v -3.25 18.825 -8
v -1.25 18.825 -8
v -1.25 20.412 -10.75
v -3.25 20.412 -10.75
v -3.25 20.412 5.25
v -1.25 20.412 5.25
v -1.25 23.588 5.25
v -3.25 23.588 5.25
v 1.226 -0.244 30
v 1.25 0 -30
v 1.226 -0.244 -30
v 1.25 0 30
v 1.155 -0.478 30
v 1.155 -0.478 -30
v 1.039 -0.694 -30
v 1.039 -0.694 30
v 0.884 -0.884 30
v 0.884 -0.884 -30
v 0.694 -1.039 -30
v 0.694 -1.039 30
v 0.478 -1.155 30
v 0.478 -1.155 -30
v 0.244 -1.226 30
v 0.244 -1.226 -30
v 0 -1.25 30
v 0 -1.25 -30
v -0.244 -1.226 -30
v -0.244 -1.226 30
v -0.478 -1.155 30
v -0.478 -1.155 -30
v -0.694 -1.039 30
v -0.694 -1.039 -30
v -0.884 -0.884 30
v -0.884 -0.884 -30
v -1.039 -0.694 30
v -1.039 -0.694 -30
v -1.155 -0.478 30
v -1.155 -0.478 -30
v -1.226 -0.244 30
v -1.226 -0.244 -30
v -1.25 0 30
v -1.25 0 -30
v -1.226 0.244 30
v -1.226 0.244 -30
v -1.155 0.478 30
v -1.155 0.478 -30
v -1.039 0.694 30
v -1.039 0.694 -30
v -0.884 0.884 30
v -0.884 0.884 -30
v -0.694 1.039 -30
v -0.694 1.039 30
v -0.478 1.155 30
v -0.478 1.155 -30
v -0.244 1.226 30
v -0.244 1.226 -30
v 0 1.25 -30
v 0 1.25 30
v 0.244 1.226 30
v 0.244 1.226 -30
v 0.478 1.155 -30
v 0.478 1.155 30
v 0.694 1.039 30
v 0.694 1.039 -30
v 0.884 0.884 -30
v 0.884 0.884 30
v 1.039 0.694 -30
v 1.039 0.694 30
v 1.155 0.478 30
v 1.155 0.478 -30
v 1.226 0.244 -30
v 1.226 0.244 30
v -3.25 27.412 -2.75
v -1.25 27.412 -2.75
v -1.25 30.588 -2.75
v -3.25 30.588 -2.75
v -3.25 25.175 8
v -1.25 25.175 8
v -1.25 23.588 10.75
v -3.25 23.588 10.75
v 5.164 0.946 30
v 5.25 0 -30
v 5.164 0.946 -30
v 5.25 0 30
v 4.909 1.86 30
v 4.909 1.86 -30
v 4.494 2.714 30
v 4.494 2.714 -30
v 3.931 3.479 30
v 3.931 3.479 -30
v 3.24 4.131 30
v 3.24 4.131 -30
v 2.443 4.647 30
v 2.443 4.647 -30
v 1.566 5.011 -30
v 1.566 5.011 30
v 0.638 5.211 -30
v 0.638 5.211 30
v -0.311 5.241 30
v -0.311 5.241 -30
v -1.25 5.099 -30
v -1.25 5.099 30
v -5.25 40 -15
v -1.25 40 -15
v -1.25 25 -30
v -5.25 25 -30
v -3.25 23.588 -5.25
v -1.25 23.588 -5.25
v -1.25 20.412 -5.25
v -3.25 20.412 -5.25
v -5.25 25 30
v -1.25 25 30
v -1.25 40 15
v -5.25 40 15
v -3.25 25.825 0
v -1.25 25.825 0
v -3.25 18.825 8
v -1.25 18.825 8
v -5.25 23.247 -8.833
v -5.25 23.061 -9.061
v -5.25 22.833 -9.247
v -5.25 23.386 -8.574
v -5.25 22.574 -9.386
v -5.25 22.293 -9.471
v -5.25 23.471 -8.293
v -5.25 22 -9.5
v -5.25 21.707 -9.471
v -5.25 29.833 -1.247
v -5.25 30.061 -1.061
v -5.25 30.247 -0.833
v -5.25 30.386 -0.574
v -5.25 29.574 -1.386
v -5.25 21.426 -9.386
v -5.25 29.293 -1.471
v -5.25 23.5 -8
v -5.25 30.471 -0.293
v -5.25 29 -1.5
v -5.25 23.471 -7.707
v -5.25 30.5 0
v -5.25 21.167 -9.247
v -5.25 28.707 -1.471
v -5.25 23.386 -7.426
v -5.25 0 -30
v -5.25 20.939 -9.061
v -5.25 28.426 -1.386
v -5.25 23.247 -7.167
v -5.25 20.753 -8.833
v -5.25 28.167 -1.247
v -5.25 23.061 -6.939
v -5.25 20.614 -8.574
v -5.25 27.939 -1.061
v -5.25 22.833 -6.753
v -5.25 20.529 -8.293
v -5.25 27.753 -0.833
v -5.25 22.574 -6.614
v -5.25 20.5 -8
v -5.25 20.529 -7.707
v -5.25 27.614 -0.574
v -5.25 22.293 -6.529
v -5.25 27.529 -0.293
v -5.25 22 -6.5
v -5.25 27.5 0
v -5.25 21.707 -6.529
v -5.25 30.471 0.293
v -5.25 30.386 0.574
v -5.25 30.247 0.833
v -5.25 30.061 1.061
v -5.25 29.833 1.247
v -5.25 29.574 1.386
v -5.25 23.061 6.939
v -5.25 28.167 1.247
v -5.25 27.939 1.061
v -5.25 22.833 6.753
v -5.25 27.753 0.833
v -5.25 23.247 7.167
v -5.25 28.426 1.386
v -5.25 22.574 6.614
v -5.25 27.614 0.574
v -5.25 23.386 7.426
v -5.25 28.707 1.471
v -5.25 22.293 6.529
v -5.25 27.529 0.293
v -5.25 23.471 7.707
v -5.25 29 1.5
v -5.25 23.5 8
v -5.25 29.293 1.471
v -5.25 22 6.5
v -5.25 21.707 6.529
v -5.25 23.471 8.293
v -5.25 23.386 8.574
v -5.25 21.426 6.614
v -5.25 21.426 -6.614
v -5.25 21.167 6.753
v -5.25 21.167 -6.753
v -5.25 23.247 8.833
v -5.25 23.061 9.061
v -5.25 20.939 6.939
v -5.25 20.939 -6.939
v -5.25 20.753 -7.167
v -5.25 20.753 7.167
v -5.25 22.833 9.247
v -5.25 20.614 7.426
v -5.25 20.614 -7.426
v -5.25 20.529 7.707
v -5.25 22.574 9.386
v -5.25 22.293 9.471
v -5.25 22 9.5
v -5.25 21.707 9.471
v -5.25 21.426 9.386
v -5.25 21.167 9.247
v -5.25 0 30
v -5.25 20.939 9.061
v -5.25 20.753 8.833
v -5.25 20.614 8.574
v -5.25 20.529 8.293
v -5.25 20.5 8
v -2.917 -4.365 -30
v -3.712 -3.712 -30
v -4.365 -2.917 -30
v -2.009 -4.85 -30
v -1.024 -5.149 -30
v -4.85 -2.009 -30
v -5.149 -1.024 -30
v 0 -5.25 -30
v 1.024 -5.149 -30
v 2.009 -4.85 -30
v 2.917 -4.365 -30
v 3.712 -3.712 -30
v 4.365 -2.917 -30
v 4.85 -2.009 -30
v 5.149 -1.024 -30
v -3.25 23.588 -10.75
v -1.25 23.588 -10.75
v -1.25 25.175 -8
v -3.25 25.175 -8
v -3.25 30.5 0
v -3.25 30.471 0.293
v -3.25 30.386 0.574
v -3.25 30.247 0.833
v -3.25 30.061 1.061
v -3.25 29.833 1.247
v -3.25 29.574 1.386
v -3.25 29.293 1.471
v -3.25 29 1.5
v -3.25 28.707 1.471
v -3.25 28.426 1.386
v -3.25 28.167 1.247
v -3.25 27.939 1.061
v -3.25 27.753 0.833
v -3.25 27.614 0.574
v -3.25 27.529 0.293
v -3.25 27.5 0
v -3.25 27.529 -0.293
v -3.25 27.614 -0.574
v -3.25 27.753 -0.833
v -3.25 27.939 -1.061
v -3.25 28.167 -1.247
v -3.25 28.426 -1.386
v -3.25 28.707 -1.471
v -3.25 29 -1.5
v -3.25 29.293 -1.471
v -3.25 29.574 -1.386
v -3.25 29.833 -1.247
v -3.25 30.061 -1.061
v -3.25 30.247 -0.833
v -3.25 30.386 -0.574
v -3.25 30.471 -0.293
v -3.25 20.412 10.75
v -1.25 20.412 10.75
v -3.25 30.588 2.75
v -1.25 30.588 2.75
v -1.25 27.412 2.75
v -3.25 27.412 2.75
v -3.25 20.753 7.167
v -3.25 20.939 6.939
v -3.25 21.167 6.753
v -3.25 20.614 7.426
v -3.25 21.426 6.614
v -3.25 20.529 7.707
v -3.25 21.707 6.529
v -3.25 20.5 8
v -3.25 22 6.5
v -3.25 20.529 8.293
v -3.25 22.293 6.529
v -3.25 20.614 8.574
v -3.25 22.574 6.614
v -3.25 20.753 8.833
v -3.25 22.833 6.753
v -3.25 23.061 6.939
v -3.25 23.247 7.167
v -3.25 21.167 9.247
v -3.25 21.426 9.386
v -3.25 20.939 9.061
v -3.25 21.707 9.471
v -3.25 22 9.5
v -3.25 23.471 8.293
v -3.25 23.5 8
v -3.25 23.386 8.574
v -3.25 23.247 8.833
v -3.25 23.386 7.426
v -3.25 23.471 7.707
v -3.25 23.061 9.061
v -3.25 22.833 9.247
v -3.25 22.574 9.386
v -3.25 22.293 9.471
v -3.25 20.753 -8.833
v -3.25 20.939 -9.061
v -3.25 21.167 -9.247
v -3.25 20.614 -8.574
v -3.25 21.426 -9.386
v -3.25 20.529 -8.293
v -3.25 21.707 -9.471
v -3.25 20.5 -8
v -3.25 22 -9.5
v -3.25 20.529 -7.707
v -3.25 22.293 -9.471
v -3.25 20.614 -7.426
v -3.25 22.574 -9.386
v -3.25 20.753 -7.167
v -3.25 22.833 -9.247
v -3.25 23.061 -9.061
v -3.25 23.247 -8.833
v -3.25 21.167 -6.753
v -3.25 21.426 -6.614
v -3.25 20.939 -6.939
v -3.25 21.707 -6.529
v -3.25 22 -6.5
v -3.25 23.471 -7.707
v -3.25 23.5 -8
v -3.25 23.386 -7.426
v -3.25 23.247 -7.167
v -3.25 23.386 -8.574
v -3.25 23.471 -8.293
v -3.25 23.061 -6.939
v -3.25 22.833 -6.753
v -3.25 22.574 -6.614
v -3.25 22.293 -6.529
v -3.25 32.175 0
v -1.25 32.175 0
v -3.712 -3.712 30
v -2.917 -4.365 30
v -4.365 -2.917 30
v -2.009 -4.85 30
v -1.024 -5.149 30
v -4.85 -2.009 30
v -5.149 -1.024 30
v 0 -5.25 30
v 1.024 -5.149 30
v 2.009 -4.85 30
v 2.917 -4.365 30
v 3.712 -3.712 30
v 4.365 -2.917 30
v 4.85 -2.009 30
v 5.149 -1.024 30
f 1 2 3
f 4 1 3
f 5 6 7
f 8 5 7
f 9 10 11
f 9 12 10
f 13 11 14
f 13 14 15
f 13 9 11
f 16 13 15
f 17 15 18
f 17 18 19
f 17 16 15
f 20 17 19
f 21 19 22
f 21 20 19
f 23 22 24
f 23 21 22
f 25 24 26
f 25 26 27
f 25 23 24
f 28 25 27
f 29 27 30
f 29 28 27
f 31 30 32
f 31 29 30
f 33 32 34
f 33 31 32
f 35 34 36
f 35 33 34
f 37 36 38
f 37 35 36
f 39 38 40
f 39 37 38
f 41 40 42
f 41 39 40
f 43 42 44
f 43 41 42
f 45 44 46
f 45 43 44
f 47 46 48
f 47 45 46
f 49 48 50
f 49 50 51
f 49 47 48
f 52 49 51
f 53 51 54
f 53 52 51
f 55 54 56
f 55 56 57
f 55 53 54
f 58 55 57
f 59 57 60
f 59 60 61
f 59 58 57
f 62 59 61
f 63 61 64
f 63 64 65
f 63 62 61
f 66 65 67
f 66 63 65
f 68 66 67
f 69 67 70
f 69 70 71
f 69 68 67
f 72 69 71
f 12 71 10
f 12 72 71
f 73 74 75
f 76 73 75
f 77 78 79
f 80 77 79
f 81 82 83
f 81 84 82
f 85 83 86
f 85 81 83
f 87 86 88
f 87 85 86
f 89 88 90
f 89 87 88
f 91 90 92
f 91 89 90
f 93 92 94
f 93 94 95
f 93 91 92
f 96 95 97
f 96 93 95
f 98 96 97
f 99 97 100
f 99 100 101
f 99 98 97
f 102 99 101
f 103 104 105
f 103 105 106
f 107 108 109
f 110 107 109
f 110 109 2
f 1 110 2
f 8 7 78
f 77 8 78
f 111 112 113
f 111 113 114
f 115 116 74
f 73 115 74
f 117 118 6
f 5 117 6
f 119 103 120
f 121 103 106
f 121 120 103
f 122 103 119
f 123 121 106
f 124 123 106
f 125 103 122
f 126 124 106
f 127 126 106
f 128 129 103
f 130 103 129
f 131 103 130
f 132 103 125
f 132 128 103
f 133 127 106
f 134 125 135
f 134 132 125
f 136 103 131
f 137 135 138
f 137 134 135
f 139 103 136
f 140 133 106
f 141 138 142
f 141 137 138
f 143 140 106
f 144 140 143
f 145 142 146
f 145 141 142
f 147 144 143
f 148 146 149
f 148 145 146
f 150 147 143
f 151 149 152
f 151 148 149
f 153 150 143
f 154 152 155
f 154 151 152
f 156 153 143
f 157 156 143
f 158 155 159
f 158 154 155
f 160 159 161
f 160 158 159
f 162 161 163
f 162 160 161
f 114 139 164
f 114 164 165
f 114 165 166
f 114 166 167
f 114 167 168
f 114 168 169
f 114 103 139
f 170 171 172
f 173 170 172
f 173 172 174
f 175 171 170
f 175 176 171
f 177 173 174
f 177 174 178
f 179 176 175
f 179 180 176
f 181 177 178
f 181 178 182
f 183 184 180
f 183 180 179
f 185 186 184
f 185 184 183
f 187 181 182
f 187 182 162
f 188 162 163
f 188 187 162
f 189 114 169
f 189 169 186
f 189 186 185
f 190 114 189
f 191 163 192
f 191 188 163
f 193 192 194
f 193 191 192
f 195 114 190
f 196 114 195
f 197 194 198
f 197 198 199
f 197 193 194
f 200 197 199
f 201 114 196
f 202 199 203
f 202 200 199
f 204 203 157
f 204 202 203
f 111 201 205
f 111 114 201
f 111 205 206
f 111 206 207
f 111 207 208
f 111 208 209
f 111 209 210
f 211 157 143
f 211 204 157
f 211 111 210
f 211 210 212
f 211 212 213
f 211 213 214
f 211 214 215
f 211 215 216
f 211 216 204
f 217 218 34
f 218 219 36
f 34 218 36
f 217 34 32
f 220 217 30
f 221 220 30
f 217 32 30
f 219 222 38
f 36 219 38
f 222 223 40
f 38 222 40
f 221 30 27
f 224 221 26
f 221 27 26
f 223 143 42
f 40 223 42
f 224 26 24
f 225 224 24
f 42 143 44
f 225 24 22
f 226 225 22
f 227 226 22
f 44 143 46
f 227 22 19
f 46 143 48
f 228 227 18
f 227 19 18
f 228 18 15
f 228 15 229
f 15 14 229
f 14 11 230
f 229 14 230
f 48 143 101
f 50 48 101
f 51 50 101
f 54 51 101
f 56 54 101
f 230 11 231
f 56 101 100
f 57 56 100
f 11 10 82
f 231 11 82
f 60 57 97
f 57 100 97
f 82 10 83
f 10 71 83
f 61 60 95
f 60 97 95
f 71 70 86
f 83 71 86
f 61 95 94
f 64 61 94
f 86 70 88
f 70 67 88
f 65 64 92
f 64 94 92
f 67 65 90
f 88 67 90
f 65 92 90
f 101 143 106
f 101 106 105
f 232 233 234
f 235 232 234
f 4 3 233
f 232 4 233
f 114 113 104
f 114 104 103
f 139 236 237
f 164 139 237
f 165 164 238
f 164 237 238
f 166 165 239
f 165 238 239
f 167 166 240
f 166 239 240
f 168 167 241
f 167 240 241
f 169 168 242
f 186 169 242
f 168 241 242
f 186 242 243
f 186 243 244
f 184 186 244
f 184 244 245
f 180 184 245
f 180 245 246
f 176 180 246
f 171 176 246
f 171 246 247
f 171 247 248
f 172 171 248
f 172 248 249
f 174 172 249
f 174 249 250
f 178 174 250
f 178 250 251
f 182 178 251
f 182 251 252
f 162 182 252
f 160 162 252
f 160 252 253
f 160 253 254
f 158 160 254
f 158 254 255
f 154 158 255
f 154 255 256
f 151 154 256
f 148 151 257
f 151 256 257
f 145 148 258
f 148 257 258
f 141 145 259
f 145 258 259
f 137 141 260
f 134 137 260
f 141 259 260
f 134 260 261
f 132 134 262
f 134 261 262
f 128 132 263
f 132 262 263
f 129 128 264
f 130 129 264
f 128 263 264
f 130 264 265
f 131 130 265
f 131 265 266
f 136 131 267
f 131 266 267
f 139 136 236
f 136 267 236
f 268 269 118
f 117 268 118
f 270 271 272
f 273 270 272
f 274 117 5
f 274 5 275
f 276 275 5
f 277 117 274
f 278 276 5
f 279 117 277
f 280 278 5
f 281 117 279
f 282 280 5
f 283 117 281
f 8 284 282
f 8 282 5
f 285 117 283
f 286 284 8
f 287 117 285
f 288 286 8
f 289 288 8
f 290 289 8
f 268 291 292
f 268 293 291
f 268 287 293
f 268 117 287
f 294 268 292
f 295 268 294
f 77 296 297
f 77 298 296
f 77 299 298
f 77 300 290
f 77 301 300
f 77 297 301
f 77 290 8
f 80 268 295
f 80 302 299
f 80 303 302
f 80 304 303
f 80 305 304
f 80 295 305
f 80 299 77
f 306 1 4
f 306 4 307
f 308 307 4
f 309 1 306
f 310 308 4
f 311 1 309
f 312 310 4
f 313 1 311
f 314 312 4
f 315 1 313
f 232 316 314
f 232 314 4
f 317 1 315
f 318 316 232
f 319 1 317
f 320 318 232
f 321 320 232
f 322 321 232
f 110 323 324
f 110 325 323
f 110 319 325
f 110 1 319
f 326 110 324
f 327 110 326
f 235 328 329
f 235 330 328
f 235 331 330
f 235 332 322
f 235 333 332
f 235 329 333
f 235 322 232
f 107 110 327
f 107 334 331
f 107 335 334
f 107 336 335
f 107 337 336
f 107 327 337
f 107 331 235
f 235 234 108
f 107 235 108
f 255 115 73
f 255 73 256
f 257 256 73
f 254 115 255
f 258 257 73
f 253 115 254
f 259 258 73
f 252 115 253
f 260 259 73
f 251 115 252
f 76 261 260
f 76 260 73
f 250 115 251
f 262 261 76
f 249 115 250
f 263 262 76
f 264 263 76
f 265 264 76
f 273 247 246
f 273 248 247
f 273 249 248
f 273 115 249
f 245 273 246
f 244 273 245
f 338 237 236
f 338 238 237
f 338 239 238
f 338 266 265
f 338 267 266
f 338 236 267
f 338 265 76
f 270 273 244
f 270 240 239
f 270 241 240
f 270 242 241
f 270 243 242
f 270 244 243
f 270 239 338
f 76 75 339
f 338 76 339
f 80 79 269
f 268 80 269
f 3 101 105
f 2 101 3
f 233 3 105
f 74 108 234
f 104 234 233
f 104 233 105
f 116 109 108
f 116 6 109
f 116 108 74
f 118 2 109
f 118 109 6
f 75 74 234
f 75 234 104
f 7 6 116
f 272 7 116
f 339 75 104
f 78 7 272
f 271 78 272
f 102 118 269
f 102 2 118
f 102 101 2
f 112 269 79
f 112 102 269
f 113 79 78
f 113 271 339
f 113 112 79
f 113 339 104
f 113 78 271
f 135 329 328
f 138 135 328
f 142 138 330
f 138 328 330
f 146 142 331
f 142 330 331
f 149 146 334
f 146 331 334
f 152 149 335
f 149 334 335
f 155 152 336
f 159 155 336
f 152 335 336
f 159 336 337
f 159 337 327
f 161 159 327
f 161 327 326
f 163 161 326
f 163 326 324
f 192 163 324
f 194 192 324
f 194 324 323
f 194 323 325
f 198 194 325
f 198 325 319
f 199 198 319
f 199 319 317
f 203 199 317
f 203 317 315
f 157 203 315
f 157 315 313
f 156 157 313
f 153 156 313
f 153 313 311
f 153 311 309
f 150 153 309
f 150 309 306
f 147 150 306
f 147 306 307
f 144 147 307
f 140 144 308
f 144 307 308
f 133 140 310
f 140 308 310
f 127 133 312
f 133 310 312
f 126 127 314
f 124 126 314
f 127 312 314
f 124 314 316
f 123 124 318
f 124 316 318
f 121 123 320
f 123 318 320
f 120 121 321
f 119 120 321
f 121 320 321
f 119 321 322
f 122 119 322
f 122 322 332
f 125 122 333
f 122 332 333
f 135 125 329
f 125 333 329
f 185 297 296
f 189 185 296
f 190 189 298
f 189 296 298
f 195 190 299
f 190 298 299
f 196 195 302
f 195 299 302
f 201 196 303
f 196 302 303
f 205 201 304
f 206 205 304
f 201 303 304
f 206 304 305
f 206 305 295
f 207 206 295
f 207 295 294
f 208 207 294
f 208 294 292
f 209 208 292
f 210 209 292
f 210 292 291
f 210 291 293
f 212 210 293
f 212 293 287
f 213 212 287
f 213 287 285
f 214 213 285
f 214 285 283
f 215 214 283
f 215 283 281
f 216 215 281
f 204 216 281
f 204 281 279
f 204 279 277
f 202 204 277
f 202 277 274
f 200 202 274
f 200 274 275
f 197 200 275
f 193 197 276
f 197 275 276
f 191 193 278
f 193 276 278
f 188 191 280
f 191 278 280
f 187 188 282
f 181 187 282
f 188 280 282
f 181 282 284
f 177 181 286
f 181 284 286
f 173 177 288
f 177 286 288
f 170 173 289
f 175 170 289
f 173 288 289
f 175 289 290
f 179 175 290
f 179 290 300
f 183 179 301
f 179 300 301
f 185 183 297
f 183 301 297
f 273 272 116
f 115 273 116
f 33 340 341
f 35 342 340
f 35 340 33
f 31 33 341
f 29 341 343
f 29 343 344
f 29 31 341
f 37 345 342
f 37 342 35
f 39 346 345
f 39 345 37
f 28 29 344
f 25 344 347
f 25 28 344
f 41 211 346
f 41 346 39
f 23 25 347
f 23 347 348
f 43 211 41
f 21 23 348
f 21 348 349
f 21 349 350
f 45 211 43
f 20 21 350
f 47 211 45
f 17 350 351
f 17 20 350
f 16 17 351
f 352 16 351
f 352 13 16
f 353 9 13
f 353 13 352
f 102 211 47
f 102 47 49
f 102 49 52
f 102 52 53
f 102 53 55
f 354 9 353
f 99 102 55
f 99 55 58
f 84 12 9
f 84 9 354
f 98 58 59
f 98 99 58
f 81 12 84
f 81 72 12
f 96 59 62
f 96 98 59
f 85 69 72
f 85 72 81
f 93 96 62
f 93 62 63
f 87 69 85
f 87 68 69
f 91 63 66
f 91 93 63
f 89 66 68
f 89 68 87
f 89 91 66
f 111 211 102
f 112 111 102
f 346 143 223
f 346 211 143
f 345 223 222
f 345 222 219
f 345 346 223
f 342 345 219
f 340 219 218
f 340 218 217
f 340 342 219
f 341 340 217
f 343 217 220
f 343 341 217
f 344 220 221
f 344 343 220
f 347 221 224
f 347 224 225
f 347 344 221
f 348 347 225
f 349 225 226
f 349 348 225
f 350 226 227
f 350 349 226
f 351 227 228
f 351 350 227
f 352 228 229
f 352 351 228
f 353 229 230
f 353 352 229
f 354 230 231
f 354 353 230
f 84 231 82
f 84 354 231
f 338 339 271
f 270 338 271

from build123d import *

# Parameters (mm, degrees)
F1_DEPTH = 30
F2_R     = 1.5
F3_DEPTH = 4.001
F4_SIZE  = 15
F5_DEPTH = 2


with BuildPart() as f1:
    # F0 (on Top) → F1 (new body, symmetric)
    with BuildSketch(Plane.XY):
        with BuildLine():
            ThreePointArc((-5.25, 0), (-4.130678, 3.24037), (-1.25, 5.09902))
            Line((-1.25, 5.09902), (-1.25, 40))
            Line((-1.25, 40), (-5.25, 40))
            Line((-5.25, 40), (-5.25, 0))
        make_face()
        with BuildLine():
            ThreePointArc((5.25, 0), (3.24037, 4.130678), (-1.25, 5.09902))
            ThreePointArc((-1.25, 5.09902), (-4.130678, 3.24037), (-5.25, 0))
            ThreePointArc((-5.25, 0), (0, -5.25), (5.25, 0))
        make_face()
        with BuildLine():
            ThreePointArc((-1.25, 0), (0, 1.25), (1.25, 0))
            ThreePointArc((1.25, 0), (0, -1.25), (-1.25, 0))
        make_face(mode=Mode.SUBTRACT)
    extrude(amount=F1_DEPTH, both=True)

    # F2 (on face) → F3 (cut, through all)
    with BuildSketch(Plane.YZ.offset(-1.25)):
        with Locations((22, 8)):
            Circle(F2_R)
        with Locations((29, 0)):
            Circle(F2_R)
        with Locations((22, -8)):
            Circle(F2_R)
    extrude(amount=-F3_DEPTH, mode=Mode.SUBTRACT)

    # F4
    f4_edges = [f1.edges().sort_by_distance(p)[0] for p in [
        (-3.25, 40, 30),
        (-3.25, 40, -30),
    ]]
    chamfer(f4_edges, length=F4_SIZE)

    # F2 (on face) → F5 (cut)
    with BuildSketch(Plane.YZ.offset(-1.25)):
        Polygon((23.587713, 10.75), (20.412287, 10.75), (18.824574, 8), (20.412287, 5.25), (23.587713, 5.25), (25.175426, 8), align=None)
        with Locations((22, 8)):
            Circle(F2_R, mode=Mode.SUBTRACT)
        Polygon((30.587713, 2.75), (27.412287, 2.75), (25.824574, 0), (27.412287, -2.75), (30.587713, -2.75), (32.175426, 0), align=None)
        with Locations((29, 0)):
            Circle(F2_R, mode=Mode.SUBTRACT)
        Polygon((23.587713, -5.25), (20.412287, -5.25), (18.824574, -8), (20.412287, -10.75), (23.587713, -10.75), (25.175426, -8), align=None)
        with Locations((22, -8)):
            Circle(F2_R, mode=Mode.SUBTRACT)
    extrude(amount=-F5_DEPTH, mode=Mode.SUBTRACT)


solid = f1.part
